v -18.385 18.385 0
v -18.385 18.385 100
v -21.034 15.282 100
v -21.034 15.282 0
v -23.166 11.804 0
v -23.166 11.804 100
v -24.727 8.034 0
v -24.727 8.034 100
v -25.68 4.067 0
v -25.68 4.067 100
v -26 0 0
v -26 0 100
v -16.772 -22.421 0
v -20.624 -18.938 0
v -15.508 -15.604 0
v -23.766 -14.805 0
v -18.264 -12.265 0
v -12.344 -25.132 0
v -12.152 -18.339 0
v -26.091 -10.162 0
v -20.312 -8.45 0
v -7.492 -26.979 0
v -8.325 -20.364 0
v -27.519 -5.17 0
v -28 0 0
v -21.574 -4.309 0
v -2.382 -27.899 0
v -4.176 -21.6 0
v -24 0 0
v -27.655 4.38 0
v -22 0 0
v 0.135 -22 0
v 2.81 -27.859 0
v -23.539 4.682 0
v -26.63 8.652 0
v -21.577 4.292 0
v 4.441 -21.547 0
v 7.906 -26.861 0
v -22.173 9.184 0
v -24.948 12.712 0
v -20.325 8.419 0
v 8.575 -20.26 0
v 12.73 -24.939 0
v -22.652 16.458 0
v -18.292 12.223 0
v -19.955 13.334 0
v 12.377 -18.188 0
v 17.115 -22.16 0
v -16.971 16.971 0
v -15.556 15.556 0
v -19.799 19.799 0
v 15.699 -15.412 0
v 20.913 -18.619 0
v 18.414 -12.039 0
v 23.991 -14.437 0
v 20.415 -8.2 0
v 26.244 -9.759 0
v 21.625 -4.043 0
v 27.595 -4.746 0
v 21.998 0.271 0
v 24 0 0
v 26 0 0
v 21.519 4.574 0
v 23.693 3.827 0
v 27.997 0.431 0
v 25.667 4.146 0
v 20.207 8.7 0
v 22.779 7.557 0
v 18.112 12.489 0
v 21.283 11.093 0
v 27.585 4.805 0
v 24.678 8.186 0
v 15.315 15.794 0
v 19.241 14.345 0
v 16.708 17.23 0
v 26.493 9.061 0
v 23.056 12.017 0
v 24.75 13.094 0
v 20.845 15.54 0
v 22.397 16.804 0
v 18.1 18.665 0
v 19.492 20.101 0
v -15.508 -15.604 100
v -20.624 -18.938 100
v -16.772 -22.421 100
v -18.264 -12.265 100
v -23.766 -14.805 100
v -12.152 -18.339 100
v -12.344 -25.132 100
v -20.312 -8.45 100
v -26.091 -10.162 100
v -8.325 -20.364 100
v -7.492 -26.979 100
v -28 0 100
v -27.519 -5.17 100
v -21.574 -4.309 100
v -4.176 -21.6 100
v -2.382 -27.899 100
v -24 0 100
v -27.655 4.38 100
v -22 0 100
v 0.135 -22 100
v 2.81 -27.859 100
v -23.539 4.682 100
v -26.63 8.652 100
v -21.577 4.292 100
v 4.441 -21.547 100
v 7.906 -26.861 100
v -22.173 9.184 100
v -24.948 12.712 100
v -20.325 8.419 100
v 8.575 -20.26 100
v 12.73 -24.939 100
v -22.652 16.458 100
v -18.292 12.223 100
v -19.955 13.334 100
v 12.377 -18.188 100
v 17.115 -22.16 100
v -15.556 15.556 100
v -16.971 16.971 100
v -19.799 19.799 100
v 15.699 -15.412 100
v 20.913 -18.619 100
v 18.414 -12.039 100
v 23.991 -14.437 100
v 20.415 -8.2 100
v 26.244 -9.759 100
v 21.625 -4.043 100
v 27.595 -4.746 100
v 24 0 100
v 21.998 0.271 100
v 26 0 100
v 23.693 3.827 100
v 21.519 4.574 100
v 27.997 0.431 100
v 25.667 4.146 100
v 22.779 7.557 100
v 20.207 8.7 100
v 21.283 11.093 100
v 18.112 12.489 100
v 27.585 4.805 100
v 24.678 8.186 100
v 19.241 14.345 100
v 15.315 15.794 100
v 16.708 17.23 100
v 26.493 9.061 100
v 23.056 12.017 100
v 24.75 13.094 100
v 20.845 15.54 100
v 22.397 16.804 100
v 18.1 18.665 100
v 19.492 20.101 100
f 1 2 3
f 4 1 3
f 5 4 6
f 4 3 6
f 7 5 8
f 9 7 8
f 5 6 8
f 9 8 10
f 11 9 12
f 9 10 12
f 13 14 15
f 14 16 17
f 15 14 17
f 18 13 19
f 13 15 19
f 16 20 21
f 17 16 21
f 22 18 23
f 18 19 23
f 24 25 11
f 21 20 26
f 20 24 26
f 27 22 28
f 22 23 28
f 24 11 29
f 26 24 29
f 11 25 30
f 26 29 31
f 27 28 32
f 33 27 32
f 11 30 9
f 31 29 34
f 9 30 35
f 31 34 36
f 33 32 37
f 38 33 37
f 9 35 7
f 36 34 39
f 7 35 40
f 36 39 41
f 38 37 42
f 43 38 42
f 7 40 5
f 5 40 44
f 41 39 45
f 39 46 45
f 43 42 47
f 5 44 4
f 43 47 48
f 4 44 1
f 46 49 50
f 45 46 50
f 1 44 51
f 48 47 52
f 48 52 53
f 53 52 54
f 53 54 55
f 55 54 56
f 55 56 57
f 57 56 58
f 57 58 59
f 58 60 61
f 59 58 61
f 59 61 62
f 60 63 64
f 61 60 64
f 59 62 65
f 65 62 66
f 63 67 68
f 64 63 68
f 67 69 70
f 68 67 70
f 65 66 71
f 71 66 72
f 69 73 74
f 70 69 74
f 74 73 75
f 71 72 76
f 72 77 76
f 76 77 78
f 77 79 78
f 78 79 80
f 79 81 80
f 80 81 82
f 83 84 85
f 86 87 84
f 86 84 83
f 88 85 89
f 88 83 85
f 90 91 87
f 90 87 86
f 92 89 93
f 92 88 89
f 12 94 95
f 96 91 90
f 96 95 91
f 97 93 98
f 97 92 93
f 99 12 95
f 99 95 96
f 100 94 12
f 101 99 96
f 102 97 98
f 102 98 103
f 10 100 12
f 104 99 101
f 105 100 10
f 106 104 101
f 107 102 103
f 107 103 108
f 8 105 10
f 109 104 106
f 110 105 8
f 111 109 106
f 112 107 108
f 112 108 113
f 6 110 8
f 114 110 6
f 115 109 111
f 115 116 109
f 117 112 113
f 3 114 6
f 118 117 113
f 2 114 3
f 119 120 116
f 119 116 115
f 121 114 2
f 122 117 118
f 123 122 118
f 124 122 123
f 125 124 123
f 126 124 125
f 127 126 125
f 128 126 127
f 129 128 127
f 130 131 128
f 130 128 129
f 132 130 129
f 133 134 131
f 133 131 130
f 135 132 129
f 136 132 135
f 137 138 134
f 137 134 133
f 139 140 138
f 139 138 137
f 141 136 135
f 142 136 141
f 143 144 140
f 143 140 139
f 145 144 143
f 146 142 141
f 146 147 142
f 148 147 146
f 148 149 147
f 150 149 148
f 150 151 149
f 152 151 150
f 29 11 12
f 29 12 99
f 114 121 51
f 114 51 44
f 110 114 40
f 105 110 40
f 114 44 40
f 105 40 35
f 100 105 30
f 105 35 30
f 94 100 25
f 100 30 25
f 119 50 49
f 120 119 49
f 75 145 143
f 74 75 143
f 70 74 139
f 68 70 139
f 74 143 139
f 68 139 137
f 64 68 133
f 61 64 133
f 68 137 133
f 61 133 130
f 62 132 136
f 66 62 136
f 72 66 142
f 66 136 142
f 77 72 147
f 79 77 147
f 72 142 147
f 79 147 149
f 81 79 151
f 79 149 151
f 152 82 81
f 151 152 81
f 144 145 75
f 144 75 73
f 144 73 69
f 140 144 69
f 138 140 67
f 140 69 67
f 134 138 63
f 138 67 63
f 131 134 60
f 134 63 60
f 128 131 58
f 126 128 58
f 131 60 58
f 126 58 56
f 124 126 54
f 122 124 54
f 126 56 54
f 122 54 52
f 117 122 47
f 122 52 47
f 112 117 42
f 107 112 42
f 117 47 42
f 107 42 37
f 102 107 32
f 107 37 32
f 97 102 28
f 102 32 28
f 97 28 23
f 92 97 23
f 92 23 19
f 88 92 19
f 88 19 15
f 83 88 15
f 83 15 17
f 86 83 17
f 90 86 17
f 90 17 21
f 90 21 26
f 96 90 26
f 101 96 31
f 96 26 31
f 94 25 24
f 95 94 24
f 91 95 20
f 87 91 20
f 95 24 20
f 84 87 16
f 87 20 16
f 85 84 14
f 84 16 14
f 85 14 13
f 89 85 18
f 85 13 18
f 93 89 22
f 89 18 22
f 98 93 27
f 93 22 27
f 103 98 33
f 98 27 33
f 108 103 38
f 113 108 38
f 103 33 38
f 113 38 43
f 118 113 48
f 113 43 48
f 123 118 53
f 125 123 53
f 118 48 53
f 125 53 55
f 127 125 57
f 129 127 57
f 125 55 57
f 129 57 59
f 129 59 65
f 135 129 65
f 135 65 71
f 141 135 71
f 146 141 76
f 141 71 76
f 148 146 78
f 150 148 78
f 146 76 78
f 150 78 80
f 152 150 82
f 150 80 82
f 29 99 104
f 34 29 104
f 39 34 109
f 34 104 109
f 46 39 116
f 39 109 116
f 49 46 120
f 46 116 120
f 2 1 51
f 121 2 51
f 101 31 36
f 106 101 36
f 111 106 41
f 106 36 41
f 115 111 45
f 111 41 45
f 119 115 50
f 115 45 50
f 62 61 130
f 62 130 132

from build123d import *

# Parameters (mm, degrees)
EXTRU_MINCE2_DEPTH      = 100
ENL_V_MAT_EXTRU_2_DEPTH = 100


with BuildPart() as part:
    # Esquisse3 → Extru.-Mince2 (new body)
    with BuildSketch(Plane.XY):
        with BuildLine():
            ThreePointArc((15.315208394, 15.793808656), (20.193436478, 8.730700042), (21.997396912, 0.338421491))
            ThreePointArc((21.997396912, 0.338421491), (0.169215751, -21.999349218), (-22, 0))
            ThreePointArc((-22, 0), (-20.325349715, 8.419035512), (-15.556349186, 15.556349186))
            Line((-15.556349186, 15.556349186), (-19.798989873, 19.798989873))
            ThreePointArc((-19.798989873, 19.798989873), (-25.86862691, 10.715136106), (-28, 0))
            ThreePointArc((-28, 0), (0.215365501, -27.999171732), (27.996686979, 0.430718261))
            ThreePointArc((27.996686979, 0.430718261), (25.700737335, 11.111800054), (19.49208341, 20.101211017))
            Line((19.49208341, 20.101211017), (15.315208394, 15.793808656))
        make_face()
    extrude(amount=EXTRU_MINCE2_DEPTH)

    # Esquisse7 → Enlèv. mat.-Extru.2 (cut)
    with BuildSketch(Plane.XY.offset(100)):
        with BuildLine():
            Line((-26, 0), (-24, 0))
            ThreePointArc((-24, 0), (0, 24), (24, 0))
            Line((24, 0), (26, 0))
            ThreePointArc((26, 0), (0, 26), (-26, 0))
        make_face()
    extrude(amount=-ENL_V_MAT_EXTRU_2_DEPTH, mode=Mode.SUBTRACT)


solid = part.part
